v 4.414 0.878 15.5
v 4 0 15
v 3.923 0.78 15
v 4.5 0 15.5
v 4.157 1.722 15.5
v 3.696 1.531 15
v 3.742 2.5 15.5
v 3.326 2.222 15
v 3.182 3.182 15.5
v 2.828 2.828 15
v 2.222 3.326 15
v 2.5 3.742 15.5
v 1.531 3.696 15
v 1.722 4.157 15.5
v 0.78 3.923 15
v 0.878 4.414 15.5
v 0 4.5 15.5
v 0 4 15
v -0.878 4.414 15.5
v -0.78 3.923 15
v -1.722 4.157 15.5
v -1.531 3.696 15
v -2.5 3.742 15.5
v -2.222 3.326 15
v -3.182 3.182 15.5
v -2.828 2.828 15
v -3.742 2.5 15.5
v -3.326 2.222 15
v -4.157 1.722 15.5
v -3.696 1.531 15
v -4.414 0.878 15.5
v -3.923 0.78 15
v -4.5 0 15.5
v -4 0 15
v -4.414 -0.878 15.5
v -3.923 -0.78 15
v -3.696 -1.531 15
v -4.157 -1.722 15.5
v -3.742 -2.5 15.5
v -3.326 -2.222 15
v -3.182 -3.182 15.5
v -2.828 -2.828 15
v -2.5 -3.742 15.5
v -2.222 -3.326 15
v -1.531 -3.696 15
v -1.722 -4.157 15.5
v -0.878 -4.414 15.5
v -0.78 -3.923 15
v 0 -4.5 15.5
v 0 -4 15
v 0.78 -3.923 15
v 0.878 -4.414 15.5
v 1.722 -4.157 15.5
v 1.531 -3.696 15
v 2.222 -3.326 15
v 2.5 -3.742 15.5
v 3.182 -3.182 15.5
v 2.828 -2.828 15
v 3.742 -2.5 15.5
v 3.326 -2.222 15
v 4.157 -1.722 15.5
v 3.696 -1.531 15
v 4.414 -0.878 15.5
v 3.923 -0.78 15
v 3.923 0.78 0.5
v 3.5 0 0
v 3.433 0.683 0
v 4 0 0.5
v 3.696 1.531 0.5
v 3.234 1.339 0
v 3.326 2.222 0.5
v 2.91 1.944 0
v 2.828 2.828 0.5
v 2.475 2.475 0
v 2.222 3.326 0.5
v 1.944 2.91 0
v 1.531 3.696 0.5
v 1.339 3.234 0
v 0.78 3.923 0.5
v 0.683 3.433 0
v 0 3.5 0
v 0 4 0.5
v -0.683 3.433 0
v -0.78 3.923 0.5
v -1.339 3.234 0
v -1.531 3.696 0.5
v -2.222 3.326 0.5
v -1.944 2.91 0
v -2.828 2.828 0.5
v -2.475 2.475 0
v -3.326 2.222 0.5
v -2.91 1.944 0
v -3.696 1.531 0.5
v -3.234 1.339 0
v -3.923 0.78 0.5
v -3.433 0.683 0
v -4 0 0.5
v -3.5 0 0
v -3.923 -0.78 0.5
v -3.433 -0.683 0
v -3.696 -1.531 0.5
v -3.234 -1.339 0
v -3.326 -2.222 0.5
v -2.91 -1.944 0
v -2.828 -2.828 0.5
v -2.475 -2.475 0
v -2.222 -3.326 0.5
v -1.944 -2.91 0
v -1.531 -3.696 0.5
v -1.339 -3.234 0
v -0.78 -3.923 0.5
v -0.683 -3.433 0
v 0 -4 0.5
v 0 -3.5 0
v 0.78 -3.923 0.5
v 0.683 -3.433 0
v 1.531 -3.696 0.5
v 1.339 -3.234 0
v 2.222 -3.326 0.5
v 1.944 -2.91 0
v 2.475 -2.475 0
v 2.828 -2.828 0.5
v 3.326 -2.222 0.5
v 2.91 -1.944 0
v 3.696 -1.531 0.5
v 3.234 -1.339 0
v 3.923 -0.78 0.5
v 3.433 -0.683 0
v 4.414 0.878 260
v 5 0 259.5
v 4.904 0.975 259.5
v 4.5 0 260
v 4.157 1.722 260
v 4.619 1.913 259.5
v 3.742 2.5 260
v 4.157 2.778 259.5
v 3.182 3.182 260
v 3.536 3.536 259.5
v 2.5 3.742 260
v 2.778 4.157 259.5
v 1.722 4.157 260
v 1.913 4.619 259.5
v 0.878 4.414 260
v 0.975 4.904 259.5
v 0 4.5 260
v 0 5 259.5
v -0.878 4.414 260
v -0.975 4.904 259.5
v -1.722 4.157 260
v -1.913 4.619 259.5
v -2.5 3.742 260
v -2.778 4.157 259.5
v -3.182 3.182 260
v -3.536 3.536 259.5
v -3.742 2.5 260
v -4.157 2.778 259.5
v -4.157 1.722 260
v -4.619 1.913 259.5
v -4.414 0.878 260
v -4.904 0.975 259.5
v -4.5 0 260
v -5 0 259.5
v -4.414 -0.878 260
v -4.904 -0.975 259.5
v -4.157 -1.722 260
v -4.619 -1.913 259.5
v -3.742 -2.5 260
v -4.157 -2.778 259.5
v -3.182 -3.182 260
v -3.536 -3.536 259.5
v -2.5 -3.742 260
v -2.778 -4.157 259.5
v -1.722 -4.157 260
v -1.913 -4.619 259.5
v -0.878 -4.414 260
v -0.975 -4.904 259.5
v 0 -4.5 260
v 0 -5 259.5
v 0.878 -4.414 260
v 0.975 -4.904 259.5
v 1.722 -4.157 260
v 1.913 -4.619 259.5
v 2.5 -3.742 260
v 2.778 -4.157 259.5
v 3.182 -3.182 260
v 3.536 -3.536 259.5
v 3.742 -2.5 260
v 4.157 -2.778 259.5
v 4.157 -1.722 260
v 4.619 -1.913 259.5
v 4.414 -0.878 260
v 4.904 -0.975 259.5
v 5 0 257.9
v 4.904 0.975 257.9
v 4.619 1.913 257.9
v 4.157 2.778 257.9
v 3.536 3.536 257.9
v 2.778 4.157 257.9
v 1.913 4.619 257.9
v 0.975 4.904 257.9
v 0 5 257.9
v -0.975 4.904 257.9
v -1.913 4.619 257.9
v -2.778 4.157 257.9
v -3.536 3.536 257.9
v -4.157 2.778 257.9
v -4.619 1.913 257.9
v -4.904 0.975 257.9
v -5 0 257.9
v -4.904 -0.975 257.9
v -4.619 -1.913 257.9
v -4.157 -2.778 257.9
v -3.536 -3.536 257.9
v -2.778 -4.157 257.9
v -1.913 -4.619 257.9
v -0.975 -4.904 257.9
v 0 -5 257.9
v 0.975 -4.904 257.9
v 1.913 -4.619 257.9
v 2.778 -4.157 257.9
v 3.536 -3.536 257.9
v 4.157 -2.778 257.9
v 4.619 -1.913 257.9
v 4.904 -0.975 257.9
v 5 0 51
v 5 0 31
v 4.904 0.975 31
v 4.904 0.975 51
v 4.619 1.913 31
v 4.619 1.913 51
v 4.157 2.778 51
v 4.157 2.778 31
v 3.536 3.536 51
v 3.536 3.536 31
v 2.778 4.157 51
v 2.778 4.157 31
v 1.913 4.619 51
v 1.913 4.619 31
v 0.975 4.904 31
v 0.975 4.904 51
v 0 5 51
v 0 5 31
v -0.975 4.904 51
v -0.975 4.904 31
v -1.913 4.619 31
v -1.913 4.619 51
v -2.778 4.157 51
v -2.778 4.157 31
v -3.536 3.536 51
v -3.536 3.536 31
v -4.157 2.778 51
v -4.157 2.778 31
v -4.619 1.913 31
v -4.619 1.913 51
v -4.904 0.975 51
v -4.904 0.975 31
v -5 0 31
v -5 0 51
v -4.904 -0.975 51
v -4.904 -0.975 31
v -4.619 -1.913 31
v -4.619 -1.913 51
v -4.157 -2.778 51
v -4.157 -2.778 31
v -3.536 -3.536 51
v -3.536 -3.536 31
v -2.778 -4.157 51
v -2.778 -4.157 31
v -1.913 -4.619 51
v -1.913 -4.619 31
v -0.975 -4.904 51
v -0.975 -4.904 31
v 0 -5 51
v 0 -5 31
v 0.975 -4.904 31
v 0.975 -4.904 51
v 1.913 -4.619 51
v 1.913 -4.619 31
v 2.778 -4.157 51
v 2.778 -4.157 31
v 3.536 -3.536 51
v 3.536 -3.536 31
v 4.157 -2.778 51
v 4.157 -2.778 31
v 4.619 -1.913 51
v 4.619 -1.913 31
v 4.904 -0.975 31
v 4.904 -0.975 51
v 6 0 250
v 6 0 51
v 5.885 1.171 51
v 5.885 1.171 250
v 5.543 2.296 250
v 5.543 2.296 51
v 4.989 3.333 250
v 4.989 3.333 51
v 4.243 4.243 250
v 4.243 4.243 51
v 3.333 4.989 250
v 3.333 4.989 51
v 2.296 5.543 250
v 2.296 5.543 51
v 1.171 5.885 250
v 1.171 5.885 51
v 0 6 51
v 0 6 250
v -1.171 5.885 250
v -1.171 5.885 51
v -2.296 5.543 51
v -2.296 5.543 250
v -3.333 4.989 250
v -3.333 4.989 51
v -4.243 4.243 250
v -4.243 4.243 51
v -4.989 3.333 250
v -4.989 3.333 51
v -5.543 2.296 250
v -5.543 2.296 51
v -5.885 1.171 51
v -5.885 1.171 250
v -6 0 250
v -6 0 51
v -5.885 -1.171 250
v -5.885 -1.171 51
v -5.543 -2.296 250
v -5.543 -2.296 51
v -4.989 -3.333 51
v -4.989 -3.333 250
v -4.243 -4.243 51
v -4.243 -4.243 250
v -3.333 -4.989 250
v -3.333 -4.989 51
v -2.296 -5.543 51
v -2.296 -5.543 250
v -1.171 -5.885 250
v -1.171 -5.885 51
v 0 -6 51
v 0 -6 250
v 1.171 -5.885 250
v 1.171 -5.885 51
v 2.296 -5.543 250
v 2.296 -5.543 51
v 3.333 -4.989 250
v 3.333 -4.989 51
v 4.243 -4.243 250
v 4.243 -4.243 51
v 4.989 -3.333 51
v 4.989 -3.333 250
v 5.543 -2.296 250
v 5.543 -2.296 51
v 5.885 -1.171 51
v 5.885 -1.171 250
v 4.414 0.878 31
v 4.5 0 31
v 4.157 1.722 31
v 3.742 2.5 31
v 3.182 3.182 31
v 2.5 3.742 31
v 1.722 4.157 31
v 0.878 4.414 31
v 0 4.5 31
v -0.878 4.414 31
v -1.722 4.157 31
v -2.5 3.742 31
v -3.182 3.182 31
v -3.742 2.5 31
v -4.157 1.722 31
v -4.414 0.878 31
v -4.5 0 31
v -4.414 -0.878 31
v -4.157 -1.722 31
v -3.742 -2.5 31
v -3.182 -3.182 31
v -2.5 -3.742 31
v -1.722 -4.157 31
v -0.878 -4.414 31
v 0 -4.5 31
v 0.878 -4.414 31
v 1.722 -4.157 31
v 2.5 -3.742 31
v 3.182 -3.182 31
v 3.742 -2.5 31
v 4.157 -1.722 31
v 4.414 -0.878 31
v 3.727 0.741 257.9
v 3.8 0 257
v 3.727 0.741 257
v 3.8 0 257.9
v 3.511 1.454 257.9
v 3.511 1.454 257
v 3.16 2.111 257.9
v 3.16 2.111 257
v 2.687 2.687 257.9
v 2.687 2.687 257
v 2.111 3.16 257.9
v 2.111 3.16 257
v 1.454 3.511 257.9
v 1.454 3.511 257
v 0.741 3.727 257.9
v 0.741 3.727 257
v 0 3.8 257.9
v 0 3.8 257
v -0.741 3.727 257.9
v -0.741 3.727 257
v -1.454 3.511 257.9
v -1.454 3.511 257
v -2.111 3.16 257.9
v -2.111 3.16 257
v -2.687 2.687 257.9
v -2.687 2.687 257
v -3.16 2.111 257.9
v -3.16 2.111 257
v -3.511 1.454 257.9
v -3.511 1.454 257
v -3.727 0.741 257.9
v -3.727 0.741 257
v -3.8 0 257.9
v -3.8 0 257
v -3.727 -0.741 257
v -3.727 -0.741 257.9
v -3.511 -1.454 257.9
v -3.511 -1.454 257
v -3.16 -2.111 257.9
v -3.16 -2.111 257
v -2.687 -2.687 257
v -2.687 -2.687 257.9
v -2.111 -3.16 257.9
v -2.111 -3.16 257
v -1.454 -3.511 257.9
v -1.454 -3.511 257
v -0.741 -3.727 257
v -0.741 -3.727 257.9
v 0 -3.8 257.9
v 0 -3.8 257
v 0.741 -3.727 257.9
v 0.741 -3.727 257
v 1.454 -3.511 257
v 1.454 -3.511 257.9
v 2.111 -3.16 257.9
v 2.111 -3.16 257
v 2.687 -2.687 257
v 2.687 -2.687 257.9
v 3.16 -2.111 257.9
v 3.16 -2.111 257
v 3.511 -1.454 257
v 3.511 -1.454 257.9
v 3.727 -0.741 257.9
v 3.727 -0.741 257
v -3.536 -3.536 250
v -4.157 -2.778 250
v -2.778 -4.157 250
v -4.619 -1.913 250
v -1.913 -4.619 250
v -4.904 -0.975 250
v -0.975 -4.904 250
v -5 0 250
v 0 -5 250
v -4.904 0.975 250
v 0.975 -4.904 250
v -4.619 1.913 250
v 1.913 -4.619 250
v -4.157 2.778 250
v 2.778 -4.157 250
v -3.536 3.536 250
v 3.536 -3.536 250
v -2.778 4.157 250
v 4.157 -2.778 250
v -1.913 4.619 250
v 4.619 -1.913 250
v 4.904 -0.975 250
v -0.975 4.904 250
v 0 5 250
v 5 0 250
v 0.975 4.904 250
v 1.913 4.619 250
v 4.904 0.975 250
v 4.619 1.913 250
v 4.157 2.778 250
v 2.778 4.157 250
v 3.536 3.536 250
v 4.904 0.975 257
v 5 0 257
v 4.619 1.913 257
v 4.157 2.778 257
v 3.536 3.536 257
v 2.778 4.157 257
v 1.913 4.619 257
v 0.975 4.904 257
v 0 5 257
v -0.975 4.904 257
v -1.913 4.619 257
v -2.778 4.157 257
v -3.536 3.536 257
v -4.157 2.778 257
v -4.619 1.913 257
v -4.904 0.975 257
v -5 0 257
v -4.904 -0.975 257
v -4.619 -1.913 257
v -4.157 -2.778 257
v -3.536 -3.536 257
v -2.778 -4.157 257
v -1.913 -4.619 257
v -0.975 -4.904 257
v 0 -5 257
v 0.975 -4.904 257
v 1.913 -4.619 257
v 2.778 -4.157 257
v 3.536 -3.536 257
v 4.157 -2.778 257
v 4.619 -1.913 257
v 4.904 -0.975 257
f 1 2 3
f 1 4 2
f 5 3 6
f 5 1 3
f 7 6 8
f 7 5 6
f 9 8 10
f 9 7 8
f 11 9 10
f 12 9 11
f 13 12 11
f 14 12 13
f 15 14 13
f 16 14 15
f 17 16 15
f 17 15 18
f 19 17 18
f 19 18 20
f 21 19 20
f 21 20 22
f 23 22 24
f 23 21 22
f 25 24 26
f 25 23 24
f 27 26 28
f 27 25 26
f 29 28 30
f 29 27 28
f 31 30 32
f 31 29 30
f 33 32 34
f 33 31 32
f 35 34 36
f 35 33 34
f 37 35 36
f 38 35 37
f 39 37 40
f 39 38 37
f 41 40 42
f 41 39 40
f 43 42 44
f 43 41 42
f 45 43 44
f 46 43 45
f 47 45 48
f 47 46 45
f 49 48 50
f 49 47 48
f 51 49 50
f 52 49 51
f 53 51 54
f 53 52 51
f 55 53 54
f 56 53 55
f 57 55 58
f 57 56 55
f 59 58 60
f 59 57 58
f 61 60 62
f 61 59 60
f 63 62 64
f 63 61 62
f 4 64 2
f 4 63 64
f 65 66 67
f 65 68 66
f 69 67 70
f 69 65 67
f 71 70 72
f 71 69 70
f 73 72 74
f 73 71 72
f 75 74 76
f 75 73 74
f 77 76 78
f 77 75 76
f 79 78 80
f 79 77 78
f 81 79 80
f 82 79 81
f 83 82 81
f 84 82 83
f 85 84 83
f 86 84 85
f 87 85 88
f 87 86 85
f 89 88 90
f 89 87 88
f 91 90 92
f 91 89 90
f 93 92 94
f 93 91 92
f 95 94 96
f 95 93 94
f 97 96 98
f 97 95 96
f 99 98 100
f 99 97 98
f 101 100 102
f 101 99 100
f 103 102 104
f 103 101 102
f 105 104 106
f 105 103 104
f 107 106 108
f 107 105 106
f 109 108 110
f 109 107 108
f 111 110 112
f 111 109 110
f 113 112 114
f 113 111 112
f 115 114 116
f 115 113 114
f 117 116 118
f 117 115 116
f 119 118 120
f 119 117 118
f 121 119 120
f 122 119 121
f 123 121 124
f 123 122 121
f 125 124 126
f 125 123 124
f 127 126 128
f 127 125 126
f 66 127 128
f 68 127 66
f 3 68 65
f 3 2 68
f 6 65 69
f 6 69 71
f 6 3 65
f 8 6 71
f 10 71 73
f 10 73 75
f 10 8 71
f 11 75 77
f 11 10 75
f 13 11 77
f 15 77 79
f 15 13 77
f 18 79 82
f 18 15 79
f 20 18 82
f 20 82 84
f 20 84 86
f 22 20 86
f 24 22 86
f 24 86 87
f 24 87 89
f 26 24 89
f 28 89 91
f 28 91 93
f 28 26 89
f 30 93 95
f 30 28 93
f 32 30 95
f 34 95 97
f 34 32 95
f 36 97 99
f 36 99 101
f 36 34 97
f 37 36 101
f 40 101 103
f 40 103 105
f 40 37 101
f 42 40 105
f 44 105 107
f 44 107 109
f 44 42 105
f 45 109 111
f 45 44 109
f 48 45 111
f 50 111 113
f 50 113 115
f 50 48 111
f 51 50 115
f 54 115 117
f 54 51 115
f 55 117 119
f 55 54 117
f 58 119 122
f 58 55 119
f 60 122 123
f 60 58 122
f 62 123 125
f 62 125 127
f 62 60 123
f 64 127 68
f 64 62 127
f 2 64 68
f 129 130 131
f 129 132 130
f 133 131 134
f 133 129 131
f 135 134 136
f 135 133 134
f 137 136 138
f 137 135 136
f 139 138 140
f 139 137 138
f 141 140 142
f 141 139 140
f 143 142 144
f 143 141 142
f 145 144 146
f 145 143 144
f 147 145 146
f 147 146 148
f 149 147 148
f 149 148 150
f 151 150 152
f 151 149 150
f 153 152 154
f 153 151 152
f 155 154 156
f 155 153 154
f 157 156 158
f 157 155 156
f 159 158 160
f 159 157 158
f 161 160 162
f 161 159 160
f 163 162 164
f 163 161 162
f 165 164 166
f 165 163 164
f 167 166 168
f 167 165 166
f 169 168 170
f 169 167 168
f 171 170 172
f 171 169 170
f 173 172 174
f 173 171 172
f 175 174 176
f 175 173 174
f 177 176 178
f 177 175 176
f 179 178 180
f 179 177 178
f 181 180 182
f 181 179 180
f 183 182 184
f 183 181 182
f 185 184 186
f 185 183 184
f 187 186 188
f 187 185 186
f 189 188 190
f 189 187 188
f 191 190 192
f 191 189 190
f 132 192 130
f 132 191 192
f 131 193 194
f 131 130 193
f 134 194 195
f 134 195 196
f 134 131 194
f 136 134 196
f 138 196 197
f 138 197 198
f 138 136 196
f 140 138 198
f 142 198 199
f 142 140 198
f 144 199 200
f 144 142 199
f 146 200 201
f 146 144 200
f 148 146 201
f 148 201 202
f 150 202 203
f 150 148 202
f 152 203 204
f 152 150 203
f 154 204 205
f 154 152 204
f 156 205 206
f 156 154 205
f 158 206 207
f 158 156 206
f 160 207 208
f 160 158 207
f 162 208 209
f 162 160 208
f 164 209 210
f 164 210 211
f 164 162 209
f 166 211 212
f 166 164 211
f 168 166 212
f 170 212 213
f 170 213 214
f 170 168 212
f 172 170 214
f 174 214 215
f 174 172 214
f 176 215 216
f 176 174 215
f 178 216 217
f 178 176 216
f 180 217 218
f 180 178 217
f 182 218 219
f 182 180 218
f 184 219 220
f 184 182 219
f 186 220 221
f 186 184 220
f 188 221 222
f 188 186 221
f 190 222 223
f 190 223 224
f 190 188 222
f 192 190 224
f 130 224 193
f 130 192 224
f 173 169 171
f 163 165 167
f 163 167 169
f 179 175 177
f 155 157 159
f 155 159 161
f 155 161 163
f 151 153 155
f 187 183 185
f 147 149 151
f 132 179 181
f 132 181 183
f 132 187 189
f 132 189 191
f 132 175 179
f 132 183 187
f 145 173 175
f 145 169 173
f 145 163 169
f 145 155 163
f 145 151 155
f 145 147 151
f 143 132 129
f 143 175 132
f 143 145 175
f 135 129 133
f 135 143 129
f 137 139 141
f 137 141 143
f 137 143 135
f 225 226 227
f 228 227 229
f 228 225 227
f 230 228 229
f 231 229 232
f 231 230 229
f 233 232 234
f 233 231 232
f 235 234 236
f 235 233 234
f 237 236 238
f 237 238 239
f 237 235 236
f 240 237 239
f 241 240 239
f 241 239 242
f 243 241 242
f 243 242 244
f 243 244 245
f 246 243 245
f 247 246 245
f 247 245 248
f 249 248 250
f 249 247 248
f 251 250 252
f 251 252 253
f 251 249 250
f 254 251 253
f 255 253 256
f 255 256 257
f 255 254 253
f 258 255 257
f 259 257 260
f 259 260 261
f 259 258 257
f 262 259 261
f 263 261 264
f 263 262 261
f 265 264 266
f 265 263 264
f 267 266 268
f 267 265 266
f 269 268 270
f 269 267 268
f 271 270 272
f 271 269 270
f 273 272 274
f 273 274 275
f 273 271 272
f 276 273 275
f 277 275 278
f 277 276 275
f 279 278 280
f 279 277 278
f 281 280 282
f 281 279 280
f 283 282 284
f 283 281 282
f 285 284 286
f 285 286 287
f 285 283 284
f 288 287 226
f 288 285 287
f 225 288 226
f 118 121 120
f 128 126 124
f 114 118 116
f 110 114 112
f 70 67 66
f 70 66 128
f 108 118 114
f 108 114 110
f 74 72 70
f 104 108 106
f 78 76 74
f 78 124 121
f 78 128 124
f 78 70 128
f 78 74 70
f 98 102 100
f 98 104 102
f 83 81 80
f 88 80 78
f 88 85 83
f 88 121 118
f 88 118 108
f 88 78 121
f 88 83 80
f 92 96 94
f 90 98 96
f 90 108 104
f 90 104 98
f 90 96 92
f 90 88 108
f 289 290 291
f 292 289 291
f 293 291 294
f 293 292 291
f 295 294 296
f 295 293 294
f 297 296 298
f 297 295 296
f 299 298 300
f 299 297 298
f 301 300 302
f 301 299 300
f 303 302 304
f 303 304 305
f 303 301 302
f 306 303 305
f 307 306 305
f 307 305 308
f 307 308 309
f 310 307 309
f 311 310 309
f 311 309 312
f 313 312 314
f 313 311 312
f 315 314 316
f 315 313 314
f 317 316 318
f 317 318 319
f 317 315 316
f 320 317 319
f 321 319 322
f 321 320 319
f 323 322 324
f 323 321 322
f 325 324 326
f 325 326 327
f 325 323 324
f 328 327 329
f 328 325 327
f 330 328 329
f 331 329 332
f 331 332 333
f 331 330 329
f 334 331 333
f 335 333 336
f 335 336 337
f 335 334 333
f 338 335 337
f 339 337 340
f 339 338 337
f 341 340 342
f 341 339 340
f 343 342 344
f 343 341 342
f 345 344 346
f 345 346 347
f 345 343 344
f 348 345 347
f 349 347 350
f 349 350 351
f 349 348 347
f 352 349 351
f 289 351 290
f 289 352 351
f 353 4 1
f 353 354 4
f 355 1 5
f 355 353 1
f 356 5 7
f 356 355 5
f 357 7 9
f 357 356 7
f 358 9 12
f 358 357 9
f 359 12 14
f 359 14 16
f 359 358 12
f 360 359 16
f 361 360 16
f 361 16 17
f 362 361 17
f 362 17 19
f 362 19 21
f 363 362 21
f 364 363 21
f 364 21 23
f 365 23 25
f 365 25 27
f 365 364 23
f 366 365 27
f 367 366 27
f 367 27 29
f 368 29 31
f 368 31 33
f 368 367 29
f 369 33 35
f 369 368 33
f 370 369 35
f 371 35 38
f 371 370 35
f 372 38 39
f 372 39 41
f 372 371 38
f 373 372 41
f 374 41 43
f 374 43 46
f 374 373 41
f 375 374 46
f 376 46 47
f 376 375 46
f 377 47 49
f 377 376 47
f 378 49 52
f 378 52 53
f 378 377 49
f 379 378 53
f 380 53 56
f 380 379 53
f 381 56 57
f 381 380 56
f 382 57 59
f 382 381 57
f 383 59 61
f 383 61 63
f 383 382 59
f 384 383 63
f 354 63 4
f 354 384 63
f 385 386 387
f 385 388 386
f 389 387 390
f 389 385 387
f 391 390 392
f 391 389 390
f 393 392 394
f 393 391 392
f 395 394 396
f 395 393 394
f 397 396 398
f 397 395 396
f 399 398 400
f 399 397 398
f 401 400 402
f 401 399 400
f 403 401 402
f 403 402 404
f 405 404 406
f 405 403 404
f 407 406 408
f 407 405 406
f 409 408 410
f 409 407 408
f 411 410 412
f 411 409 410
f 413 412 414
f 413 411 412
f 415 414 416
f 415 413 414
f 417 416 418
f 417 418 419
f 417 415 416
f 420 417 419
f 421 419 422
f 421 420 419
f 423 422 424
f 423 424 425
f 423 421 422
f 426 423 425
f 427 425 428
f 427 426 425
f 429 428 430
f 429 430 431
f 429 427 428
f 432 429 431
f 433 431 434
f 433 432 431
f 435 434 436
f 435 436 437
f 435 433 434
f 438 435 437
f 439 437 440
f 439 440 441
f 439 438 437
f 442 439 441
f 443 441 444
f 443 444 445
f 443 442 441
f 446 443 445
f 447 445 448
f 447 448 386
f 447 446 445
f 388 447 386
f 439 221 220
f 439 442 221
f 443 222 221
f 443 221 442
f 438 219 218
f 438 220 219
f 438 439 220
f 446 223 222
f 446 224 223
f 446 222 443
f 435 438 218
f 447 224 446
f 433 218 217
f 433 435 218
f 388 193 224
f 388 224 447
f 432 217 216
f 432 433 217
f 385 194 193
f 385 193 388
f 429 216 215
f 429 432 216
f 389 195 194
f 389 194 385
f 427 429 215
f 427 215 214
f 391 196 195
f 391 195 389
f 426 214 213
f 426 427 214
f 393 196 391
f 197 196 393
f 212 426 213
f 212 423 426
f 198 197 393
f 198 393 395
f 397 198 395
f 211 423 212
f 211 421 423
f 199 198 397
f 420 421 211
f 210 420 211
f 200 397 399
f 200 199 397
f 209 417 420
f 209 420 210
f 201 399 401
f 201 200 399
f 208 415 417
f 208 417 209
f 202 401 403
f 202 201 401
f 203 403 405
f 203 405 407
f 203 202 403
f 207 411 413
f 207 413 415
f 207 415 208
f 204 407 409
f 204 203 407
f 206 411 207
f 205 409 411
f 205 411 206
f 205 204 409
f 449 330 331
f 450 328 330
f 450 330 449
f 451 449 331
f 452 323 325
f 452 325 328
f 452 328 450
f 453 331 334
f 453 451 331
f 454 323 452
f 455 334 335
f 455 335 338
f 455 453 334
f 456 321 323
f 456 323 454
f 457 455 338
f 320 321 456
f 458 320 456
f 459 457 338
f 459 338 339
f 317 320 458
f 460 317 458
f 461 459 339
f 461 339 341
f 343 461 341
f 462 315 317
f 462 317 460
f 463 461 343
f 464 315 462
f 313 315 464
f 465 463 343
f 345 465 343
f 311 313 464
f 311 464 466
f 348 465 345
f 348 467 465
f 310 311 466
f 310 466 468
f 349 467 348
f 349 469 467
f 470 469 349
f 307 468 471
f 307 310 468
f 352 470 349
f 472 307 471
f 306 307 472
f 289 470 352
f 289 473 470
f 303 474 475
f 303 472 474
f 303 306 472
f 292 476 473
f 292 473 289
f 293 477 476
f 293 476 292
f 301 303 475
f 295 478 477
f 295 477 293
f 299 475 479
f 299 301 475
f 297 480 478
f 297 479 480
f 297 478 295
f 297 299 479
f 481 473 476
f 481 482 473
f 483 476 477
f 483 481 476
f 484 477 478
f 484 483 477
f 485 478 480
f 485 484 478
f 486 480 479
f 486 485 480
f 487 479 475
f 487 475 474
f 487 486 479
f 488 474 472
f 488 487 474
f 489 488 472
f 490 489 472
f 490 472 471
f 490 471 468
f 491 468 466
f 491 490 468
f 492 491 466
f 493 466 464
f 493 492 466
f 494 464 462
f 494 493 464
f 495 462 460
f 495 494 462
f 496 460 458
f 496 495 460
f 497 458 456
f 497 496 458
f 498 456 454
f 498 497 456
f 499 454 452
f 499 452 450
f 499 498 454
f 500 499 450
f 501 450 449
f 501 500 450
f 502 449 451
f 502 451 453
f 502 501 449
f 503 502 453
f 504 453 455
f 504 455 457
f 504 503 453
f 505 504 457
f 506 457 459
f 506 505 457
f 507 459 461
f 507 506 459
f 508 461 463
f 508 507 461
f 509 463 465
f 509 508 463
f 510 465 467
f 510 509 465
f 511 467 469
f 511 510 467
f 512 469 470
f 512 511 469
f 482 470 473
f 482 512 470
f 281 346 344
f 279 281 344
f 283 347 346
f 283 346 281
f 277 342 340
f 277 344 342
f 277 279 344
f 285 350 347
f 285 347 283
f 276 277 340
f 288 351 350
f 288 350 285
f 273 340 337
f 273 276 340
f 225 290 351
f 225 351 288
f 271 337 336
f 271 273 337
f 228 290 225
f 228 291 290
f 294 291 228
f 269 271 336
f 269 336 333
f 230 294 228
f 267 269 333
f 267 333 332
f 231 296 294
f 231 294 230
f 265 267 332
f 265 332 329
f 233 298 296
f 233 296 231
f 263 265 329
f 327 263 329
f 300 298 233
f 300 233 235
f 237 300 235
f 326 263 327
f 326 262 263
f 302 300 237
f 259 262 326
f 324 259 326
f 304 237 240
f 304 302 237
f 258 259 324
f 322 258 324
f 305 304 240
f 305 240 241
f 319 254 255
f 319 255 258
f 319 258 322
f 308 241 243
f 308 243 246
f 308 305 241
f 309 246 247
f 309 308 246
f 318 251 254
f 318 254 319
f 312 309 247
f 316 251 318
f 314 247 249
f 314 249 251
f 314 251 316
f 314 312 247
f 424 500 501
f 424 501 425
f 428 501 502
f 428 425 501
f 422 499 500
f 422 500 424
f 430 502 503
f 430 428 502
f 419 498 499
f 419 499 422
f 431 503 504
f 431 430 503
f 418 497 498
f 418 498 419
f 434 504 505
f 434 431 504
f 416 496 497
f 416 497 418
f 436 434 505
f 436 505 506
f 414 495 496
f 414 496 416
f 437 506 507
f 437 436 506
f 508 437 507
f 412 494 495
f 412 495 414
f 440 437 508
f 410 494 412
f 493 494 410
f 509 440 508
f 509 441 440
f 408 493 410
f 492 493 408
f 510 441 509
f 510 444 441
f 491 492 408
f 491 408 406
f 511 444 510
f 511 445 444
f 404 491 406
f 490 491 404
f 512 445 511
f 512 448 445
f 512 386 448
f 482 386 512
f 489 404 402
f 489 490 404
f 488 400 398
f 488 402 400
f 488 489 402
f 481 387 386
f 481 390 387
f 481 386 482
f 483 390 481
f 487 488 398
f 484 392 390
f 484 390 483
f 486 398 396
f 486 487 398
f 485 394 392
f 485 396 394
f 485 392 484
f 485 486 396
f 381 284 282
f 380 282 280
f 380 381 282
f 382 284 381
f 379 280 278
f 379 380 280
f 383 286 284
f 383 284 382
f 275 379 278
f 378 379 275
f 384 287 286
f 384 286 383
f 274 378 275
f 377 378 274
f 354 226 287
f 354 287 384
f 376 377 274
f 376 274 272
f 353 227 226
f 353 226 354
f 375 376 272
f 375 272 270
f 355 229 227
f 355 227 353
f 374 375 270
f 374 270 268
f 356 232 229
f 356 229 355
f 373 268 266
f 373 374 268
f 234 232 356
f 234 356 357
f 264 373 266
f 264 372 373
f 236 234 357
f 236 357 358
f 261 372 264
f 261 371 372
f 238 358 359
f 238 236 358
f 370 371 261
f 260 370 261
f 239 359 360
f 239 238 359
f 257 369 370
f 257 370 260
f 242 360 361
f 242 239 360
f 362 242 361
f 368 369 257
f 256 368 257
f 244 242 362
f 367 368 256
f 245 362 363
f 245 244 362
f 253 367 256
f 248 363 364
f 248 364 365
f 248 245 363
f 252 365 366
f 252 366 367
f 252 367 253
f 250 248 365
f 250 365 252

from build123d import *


with BuildPart() as f1:
    # F0 (on Front) → F1 (revolve)
    with BuildSketch(Plane.XZ):
        Polygon((0, 260), (0, 0), (3.5, 0), (4, 0.5), (4, 15), (4.5, 15.5), (4.5, 31), (5, 31), (5, 51), (6, 51), (6, 250), (5, 250), (5, 257), (3.8, 257), (3.8, 257.9), (5, 257.9), (5, 259.5), (4.5, 260), align=None)
    revolve(axis=Axis((0, 0, 142.919585), (0, 0, 1)))


solid = f1.part
